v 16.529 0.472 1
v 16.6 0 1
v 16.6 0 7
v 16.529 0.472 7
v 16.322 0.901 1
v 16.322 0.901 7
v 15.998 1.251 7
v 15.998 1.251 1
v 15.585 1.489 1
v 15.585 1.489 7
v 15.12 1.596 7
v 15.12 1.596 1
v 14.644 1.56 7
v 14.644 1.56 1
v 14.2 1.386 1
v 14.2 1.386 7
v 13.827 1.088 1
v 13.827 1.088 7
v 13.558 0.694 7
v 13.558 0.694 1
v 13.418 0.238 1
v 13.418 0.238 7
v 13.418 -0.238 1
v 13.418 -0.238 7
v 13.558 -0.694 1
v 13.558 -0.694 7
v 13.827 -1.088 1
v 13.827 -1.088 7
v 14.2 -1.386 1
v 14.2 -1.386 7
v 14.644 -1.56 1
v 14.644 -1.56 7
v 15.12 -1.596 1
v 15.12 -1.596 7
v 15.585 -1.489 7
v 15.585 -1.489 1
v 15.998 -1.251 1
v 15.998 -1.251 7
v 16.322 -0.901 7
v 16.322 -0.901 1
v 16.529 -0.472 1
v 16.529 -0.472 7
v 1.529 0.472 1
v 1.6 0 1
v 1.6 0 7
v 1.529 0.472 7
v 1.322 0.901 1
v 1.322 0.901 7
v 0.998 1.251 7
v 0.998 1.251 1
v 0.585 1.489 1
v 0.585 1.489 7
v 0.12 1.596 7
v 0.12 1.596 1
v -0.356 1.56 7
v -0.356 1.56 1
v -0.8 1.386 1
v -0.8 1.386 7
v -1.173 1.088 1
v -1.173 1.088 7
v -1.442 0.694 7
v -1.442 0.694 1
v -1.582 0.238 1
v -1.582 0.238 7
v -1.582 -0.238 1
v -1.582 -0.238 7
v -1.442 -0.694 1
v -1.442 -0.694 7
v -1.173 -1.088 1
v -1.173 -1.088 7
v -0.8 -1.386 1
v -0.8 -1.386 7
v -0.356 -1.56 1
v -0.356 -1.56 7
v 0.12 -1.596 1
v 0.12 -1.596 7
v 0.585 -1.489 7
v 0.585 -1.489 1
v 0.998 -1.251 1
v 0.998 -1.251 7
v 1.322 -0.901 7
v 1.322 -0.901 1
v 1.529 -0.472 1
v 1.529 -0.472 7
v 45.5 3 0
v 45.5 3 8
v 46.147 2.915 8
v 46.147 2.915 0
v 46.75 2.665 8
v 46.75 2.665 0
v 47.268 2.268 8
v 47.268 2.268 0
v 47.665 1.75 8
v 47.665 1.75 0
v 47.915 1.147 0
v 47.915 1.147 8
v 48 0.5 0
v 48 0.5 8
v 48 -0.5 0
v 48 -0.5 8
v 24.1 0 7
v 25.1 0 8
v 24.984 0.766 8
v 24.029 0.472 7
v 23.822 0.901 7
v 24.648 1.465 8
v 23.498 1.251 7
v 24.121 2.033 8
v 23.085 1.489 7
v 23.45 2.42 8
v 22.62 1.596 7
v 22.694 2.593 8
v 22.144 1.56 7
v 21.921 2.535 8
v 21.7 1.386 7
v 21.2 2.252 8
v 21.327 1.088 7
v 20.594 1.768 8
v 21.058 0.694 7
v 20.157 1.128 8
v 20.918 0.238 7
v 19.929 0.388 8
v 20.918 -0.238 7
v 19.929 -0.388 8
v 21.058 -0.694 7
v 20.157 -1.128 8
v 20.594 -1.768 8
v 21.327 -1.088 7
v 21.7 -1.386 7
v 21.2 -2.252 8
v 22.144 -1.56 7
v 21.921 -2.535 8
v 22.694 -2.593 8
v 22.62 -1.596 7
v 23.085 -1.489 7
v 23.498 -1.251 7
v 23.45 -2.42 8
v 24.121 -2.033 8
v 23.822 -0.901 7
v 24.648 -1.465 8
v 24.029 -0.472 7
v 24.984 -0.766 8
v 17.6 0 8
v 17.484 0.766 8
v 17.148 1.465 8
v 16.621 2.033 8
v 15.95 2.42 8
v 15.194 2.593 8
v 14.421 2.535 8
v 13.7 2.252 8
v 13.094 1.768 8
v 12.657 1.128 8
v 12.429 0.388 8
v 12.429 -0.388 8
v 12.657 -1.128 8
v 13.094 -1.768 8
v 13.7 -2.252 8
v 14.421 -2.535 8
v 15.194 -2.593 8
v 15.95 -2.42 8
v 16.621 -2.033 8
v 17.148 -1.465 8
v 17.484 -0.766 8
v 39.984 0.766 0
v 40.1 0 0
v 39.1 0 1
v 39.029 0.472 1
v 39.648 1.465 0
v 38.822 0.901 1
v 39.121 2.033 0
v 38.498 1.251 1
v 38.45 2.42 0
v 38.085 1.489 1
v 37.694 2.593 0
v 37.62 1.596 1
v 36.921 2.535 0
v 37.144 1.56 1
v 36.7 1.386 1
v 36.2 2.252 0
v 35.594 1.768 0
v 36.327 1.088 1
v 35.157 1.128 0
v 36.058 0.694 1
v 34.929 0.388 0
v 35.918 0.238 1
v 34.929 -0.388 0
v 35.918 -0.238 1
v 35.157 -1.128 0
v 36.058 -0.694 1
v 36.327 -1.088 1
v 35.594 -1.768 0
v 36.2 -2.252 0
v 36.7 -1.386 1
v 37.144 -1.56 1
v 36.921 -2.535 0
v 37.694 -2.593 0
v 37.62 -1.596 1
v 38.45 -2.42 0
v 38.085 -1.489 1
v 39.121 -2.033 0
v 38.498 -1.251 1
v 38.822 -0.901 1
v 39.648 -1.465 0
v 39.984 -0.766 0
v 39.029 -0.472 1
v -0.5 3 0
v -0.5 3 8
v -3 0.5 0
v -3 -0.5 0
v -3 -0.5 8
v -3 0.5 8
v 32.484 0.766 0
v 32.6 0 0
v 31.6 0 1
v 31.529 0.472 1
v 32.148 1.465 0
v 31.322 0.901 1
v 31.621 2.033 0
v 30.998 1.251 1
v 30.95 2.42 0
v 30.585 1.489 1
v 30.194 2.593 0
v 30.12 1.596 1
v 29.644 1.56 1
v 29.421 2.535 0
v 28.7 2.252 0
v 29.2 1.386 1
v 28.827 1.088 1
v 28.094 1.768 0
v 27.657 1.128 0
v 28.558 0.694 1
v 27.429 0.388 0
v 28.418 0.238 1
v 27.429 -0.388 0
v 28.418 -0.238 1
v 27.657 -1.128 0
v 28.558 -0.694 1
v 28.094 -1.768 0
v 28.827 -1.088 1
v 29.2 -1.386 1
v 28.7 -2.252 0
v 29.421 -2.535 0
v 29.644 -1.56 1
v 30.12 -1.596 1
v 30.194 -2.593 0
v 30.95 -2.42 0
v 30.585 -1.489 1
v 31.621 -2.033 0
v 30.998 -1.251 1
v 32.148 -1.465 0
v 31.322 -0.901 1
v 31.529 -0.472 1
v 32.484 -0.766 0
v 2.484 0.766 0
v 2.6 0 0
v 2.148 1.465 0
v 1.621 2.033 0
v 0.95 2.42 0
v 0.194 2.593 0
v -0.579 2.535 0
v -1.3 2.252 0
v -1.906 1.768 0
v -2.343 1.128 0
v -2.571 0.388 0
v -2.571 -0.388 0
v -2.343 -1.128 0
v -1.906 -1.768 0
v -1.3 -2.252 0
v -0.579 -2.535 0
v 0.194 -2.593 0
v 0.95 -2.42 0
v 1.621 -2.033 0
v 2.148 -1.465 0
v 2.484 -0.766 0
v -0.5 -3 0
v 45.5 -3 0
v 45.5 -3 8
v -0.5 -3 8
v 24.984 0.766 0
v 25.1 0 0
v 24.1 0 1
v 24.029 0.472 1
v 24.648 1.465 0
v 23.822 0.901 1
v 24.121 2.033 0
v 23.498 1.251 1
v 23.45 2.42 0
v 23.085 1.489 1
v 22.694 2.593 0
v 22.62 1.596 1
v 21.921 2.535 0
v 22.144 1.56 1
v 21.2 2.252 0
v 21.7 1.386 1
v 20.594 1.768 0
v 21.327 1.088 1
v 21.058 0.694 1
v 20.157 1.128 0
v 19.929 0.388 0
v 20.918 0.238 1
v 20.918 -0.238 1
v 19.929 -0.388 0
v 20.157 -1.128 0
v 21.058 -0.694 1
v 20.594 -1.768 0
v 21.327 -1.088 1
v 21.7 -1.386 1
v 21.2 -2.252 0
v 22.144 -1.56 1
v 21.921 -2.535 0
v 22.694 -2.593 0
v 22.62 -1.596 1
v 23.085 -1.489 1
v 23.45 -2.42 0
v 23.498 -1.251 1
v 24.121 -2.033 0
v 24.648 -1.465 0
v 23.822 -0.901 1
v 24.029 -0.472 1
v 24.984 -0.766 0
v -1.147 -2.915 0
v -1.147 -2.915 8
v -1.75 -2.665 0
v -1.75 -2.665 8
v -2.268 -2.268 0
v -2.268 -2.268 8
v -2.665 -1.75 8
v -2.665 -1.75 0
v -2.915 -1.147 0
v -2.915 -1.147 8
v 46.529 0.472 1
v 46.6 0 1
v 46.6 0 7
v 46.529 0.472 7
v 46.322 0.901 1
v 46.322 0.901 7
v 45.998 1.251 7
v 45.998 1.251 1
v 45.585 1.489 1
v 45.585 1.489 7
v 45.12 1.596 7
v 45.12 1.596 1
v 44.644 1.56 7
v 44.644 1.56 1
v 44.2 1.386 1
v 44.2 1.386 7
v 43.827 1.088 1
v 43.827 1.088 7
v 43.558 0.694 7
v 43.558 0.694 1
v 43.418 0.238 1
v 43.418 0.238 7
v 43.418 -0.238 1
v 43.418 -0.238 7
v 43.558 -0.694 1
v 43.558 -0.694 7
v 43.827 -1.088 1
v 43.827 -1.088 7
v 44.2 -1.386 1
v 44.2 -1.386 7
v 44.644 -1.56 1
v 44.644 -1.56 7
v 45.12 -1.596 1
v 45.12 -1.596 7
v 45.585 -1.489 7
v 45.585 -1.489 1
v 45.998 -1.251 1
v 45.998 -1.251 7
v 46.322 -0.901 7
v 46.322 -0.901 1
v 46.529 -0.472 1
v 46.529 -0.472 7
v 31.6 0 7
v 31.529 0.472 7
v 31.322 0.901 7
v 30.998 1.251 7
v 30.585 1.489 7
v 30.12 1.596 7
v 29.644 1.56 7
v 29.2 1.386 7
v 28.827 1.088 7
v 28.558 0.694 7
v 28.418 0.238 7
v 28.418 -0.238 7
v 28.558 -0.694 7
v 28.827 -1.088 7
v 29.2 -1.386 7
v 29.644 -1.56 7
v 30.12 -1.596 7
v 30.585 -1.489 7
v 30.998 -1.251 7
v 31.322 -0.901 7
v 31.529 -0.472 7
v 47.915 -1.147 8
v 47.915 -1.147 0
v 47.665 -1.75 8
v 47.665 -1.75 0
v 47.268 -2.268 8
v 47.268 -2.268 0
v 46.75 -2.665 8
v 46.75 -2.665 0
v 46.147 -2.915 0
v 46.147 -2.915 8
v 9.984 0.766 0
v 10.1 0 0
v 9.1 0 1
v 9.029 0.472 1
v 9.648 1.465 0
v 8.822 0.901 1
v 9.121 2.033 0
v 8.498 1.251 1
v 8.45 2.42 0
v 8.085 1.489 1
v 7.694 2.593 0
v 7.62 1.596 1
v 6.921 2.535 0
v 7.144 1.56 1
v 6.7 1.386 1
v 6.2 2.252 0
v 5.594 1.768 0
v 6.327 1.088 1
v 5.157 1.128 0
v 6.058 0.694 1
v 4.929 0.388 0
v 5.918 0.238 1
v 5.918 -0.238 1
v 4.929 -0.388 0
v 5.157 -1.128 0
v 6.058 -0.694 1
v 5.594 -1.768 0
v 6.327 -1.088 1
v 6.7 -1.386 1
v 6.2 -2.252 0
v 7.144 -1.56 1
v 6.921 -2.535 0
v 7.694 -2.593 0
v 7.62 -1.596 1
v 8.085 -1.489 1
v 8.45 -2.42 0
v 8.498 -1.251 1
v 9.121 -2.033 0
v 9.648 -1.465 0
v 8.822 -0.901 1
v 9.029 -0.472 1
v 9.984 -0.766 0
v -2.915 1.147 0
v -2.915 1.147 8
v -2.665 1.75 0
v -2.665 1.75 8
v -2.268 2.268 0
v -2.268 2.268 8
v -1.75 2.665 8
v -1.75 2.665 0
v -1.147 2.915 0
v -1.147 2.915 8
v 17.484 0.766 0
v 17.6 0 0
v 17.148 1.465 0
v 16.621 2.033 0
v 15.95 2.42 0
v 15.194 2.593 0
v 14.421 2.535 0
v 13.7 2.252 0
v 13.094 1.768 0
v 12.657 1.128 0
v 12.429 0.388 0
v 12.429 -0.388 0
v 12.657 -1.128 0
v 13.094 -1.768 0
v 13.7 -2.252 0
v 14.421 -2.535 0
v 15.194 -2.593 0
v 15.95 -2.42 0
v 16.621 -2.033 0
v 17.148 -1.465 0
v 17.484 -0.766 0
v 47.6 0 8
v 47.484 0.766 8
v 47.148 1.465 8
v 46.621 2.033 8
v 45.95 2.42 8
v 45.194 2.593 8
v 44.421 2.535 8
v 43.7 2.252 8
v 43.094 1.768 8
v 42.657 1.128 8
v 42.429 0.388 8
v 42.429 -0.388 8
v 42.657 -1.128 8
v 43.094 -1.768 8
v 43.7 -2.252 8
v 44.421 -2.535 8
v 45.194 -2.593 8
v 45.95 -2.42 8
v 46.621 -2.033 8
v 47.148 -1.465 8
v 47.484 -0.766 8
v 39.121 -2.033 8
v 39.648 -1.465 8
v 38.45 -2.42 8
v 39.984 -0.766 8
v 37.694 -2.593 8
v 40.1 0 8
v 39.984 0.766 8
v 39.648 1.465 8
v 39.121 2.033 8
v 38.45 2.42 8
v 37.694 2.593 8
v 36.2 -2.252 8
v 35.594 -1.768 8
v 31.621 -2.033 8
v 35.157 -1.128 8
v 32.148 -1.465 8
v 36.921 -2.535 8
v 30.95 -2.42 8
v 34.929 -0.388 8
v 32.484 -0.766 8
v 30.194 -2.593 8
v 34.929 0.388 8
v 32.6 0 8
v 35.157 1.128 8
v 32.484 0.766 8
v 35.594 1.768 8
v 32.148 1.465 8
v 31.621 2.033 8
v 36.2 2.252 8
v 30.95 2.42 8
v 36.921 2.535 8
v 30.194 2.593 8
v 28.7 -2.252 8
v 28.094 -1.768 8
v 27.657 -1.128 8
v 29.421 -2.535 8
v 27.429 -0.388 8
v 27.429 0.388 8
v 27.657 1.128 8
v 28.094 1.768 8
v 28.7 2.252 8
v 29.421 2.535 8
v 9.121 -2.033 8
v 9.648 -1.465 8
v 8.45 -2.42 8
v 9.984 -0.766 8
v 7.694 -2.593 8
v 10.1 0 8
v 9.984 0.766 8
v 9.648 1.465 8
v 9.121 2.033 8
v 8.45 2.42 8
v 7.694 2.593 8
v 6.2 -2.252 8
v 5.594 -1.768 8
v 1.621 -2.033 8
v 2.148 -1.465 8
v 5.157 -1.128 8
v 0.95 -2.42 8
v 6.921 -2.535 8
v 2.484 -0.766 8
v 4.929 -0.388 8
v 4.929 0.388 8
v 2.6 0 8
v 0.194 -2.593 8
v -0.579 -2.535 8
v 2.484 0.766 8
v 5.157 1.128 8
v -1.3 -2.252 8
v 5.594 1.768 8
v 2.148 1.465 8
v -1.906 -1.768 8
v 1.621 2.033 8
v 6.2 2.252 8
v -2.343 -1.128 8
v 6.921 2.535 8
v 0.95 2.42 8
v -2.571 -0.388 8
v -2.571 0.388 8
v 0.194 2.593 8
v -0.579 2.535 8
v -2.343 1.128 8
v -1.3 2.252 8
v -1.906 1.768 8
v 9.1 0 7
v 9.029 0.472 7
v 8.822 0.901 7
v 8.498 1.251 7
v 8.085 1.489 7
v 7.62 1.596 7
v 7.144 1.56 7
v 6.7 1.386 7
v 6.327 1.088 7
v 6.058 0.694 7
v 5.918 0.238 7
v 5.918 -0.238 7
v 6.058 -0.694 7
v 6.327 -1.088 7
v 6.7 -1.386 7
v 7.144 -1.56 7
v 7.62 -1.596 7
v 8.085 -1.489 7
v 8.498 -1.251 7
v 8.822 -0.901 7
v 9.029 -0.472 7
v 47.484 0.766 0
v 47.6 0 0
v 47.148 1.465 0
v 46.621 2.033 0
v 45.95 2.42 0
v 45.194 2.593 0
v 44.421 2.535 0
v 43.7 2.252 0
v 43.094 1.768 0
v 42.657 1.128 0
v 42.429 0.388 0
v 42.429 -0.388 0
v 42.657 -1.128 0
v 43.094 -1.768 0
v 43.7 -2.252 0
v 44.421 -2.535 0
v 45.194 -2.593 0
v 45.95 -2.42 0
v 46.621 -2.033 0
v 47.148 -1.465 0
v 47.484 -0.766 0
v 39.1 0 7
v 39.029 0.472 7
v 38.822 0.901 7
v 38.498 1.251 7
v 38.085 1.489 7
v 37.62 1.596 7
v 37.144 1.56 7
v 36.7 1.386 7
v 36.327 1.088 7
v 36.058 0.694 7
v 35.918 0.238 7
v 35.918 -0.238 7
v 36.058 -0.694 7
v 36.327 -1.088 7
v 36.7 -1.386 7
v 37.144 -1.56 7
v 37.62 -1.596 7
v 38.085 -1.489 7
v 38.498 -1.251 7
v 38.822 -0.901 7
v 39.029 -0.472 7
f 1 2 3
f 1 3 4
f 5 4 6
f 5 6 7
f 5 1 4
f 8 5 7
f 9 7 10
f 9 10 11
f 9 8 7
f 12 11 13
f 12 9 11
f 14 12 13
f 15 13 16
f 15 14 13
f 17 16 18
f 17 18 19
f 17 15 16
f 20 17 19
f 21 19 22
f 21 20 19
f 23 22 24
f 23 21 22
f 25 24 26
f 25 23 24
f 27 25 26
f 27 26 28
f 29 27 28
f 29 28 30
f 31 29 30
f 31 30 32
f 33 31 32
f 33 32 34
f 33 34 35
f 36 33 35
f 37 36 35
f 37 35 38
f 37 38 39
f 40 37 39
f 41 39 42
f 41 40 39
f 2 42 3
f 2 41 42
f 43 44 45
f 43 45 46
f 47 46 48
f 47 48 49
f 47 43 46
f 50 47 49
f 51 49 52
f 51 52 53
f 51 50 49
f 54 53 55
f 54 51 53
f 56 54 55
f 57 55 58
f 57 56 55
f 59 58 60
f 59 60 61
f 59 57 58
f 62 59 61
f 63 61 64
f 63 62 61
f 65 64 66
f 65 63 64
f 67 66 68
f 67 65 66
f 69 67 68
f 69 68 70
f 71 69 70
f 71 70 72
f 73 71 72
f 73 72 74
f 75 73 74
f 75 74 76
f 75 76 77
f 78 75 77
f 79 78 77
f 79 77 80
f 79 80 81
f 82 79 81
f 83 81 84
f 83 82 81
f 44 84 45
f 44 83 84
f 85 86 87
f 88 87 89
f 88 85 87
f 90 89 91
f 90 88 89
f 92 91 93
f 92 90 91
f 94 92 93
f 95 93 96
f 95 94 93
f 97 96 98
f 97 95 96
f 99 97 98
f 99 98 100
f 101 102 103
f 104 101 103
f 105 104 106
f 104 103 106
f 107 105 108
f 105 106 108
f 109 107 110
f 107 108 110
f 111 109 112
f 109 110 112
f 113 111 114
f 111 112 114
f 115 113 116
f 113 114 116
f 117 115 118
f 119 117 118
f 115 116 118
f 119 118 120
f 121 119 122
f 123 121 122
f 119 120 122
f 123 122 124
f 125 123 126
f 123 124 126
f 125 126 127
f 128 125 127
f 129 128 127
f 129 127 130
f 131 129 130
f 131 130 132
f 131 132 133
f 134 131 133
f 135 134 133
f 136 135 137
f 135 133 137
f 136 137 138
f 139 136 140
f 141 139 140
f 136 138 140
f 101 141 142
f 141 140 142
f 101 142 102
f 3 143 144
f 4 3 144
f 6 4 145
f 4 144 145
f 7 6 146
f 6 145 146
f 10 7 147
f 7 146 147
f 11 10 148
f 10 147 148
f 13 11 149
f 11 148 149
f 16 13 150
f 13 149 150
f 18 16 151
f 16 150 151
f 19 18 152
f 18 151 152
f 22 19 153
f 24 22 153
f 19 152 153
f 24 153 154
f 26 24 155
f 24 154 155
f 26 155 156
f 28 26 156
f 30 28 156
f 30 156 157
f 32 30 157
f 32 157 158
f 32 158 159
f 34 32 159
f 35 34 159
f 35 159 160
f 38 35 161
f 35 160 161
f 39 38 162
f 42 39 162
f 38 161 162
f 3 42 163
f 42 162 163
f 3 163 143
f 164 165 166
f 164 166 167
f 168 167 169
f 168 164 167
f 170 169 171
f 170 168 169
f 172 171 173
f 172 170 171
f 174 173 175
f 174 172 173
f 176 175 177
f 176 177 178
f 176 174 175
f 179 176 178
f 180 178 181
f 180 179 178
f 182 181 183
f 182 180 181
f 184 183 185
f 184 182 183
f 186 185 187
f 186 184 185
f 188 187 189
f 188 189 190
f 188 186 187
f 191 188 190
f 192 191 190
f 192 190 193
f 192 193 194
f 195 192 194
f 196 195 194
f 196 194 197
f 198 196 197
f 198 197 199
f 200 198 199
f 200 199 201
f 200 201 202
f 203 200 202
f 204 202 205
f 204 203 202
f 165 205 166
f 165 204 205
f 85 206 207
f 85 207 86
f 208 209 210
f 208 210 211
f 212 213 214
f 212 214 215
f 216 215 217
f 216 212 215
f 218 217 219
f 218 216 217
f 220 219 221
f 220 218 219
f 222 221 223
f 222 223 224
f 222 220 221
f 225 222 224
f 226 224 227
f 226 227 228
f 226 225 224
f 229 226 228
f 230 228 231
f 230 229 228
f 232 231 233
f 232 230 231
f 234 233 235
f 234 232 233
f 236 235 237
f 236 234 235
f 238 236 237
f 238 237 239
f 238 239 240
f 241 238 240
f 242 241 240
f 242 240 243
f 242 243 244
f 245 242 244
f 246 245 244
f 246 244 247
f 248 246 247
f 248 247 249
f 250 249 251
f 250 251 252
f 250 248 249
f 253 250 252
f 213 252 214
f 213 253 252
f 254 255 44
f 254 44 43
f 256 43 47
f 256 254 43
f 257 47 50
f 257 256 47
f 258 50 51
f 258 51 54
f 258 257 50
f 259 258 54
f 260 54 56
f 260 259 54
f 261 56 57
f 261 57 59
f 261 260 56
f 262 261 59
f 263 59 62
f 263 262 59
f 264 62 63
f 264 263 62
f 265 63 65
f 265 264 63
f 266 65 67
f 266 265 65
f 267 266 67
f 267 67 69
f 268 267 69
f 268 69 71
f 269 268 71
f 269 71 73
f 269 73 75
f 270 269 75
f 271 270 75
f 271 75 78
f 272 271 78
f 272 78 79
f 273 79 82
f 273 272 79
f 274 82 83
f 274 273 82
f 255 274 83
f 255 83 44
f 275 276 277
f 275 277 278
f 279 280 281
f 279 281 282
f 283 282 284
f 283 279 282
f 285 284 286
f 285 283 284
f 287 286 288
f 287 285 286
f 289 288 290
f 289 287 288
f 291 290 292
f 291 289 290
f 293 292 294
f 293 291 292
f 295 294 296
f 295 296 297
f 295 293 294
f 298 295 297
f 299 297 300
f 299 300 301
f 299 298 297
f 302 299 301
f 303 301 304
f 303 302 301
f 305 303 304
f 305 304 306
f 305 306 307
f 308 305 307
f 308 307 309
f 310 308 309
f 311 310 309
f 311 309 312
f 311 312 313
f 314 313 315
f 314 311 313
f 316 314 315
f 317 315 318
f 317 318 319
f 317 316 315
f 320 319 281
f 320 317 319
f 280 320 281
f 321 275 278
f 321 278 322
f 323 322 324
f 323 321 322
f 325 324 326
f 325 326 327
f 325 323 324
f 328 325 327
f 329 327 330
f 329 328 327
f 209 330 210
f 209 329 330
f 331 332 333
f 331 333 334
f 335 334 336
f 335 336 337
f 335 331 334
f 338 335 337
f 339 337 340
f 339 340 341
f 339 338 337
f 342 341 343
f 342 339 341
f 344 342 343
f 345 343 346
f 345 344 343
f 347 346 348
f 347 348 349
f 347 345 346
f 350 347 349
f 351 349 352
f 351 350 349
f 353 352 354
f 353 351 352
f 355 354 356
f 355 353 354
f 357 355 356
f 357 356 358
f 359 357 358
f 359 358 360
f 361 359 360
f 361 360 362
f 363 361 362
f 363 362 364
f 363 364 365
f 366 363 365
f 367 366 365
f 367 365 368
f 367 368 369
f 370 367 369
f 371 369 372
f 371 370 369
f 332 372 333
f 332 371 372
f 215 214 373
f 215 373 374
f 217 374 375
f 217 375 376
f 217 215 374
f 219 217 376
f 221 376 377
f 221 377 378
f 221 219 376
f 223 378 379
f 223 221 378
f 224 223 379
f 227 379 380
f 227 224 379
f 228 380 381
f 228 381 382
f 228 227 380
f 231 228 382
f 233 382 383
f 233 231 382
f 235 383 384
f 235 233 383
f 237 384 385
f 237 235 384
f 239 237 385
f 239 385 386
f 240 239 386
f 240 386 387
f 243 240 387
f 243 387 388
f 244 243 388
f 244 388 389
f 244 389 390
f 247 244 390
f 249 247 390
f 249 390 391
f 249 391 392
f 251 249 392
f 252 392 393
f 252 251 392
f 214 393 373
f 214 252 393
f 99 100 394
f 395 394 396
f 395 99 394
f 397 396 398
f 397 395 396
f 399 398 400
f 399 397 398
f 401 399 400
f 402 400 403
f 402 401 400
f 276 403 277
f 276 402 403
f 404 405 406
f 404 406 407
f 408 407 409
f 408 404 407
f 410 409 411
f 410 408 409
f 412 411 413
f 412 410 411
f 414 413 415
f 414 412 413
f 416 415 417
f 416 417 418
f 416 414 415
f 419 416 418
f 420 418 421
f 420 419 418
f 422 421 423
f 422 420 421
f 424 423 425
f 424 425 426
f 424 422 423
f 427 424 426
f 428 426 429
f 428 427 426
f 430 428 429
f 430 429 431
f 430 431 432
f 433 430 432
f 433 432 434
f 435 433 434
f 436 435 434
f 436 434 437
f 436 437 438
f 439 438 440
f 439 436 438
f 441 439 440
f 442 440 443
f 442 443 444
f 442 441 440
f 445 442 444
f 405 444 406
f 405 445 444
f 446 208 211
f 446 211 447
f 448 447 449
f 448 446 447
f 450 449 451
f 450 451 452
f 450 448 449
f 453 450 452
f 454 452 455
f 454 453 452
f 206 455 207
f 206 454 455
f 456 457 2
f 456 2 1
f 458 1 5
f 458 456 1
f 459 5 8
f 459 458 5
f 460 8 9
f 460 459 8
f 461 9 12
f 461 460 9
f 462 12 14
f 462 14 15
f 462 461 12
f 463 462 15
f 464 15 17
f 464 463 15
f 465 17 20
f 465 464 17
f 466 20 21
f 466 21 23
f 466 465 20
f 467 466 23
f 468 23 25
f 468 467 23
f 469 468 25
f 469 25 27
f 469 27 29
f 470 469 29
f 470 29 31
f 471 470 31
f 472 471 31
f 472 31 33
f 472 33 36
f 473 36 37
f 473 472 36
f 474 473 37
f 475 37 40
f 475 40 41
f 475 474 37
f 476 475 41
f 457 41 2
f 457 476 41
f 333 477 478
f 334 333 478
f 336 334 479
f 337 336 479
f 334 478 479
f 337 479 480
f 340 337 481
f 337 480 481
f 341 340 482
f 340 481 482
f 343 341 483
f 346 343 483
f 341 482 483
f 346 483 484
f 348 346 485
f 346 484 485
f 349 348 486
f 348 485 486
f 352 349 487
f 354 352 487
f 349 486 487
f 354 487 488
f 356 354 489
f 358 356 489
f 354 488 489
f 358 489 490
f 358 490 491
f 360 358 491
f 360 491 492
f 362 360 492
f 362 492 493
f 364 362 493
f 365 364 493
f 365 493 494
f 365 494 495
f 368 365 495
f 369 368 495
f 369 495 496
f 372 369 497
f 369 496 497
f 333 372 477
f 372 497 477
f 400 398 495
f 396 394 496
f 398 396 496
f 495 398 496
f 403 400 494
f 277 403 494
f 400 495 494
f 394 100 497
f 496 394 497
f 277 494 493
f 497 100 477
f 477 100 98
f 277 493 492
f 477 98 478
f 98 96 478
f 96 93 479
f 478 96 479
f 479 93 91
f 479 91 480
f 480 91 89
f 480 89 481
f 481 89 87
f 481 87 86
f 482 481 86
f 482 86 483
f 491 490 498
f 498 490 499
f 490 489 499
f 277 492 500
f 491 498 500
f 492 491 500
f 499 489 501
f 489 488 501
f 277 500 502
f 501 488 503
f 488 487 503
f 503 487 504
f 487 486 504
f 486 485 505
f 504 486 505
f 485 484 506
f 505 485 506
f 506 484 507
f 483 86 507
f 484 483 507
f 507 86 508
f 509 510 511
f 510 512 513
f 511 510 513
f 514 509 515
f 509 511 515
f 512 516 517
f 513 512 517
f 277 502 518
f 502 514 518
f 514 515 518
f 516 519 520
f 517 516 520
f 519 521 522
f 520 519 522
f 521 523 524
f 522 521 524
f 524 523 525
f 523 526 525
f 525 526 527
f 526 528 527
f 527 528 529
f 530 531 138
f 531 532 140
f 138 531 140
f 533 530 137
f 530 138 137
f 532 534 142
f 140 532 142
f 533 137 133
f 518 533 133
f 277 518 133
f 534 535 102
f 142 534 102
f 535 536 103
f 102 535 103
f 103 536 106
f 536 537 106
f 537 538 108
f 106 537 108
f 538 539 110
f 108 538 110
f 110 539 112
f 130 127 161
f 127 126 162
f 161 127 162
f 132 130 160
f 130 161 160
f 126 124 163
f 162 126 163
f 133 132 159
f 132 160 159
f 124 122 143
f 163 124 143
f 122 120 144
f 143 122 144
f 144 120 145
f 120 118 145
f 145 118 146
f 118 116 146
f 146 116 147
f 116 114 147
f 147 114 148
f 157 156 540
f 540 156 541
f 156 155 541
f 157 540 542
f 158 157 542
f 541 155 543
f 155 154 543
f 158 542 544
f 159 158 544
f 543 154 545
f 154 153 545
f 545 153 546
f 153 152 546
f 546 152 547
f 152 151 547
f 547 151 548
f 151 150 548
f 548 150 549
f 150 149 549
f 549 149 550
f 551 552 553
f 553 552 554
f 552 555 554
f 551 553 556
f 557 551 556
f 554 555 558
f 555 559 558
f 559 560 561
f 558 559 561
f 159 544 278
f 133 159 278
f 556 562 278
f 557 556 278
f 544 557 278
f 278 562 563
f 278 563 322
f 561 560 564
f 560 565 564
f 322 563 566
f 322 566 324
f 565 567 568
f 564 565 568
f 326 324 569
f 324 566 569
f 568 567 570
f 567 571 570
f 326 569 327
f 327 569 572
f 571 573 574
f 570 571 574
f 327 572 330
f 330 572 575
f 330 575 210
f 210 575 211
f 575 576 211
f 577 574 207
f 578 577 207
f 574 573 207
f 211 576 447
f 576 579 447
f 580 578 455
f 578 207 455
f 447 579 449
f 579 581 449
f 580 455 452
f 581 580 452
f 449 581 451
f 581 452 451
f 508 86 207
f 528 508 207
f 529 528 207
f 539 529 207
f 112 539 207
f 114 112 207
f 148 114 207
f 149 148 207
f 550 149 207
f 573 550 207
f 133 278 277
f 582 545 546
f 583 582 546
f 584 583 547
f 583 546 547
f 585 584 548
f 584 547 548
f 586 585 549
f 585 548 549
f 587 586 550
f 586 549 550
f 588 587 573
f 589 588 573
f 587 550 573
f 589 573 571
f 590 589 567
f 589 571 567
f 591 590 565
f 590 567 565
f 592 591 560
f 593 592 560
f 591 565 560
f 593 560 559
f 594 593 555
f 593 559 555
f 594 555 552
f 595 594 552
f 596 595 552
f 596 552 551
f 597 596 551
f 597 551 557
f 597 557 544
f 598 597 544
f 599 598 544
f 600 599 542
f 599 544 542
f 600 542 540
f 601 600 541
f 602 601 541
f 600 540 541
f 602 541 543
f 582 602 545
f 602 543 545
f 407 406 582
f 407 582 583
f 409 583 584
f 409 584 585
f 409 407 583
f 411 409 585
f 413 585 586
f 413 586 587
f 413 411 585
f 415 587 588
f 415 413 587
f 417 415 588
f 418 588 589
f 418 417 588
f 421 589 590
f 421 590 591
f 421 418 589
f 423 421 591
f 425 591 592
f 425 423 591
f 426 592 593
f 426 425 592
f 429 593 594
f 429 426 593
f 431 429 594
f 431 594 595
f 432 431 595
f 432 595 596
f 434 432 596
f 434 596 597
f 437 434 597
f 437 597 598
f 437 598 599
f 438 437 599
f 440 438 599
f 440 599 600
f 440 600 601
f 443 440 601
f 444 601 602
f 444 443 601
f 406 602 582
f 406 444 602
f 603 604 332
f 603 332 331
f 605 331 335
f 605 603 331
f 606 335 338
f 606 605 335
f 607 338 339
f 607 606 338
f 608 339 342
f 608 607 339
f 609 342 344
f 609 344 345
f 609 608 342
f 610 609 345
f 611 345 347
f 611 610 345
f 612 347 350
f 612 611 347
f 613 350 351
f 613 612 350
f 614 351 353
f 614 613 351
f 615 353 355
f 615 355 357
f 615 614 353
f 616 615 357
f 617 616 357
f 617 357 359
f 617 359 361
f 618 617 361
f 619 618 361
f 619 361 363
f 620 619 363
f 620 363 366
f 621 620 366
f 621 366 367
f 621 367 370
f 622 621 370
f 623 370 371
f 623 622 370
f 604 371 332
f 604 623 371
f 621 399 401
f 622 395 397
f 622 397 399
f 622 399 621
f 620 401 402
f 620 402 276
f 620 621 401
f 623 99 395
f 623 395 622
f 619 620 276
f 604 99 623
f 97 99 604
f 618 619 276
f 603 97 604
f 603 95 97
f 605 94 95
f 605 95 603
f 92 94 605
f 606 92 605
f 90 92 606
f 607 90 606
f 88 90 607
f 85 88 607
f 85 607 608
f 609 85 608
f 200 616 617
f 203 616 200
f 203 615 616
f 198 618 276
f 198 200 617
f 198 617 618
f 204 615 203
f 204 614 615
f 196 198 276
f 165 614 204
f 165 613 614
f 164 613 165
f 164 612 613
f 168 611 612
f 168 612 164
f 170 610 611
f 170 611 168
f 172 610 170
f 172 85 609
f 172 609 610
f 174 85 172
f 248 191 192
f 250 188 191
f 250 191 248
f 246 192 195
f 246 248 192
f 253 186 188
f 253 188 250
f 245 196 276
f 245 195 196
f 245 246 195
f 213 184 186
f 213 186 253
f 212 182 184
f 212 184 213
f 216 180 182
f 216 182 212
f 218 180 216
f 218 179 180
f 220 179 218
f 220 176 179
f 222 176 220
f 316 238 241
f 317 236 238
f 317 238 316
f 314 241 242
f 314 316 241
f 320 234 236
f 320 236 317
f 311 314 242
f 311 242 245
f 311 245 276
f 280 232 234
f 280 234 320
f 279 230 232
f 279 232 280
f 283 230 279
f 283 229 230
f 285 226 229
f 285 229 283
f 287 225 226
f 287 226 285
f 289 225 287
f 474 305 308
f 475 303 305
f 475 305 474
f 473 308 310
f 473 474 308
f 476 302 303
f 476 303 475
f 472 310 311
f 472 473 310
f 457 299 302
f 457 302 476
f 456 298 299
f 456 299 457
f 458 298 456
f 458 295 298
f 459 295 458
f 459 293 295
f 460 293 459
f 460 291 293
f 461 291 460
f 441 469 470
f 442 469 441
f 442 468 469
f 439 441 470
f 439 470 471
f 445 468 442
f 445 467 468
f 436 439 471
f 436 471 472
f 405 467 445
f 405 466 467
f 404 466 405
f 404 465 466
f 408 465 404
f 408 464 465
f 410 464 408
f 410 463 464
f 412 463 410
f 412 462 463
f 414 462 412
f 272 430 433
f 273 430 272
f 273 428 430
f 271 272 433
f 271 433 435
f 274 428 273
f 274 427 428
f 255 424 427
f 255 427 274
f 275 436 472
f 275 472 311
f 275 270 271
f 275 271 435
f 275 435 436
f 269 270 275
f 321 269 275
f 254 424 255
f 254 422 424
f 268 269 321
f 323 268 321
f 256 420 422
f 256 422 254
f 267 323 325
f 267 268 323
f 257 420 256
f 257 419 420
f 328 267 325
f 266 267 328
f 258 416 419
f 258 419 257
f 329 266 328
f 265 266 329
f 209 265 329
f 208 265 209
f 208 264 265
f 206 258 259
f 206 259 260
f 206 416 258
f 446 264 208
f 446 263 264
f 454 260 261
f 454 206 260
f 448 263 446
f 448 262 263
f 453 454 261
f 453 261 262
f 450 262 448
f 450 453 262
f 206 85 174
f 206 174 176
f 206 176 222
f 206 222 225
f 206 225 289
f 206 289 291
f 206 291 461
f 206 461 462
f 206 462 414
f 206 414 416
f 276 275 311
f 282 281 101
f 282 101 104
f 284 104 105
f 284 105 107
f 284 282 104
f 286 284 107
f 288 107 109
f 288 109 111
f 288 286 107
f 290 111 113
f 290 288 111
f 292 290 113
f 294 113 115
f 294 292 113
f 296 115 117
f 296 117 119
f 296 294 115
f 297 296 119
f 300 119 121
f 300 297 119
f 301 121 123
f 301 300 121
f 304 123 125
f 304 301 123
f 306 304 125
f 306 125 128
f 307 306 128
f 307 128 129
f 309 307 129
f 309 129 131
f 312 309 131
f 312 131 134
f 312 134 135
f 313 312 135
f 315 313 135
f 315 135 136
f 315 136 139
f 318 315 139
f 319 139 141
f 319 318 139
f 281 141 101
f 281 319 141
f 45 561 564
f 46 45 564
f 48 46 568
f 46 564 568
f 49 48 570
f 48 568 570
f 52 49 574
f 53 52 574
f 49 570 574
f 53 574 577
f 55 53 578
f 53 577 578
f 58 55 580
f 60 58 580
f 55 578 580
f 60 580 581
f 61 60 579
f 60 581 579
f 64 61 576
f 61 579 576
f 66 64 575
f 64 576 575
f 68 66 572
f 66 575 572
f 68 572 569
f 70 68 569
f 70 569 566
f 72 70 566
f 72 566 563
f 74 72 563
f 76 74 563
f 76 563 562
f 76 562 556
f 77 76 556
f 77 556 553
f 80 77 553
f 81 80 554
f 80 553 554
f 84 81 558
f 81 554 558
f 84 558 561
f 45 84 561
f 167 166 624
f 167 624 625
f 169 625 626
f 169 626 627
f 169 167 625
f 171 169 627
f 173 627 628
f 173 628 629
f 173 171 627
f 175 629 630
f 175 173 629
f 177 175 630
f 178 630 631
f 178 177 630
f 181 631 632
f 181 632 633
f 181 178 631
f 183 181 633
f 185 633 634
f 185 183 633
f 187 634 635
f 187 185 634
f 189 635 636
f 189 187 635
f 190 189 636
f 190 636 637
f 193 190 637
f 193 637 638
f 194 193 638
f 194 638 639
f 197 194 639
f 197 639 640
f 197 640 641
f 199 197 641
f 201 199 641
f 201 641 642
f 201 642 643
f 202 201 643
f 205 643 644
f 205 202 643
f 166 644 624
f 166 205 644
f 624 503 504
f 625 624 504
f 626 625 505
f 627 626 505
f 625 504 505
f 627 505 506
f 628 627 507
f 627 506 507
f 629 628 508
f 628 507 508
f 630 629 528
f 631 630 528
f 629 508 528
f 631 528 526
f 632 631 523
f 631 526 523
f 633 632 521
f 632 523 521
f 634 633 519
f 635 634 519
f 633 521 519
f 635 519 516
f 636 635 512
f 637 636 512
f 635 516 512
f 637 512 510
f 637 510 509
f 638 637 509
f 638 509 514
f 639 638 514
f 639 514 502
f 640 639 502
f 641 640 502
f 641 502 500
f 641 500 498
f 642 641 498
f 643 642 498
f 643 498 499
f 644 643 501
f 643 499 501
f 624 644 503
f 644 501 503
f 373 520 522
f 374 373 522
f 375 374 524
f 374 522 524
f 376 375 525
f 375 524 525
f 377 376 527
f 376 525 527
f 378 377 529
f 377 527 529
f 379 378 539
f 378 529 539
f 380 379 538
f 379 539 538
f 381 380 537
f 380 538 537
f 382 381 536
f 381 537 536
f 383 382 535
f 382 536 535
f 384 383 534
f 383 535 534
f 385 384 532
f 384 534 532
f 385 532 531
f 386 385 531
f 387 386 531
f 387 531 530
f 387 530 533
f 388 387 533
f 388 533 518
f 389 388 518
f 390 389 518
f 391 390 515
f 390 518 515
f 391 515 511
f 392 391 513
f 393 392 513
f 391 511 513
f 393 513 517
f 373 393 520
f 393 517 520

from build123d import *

# Parameters (mm, degrees)
SKETCH1_R           = 1.6
BOSS_EXTRUDE1_DEPTH = 8
CHAMFER1_SIZE       = 1


with BuildPart() as part:
    # Sketch1 → Boss-Extrude1 (new body)
    with BuildSketch(Plane.XY):
        with BuildLine():
            Line((-0.5, 3), (45.5, 3))
            ThreePointArc((45.5, 3), (47.267766953, 2.267766953), (48, 0.5))
            Line((48, 0.5), (48, -0.5))
            ThreePointArc((48, -0.5), (47.267766953, -2.267766953), (45.5, -3))
            Line((45.5, -3), (-0.5, -3))
            ThreePointArc((-0.5, -3), (-2.267766953, -2.267766953), (-3, -0.5))
            Line((-3, -0.5), (-3, 0.5))
            ThreePointArc((-3, 0.5), (-2.267766953, 2.267766953), (-0.5, 3))
        make_face()
        Circle(SKETCH1_R, mode=Mode.SUBTRACT)
        with Locations((7.5, 0)):
            Circle(SKETCH1_R, mode=Mode.SUBTRACT)
        with Locations((15, 0)):
            Circle(SKETCH1_R, mode=Mode.SUBTRACT)
        with Locations((22.5, 0)):
            Circle(SKETCH1_R, mode=Mode.SUBTRACT)
        with Locations((30, 0)):
            Circle(SKETCH1_R, mode=Mode.SUBTRACT)
        with Locations((37.5, 0)):
            Circle(SKETCH1_R, mode=Mode.SUBTRACT)
        with Locations((45, 0)):
            Circle(SKETCH1_R, mode=Mode.SUBTRACT)
    extrude(amount=BOSS_EXTRUDE1_DEPTH)

    # Chamfer1
    chamfer1_edges = [part.edges().sort_by_distance(p)[0] for p in [
        (-1.6, 0, 0),
        (-1.6, 0, 8),
        (5.9, 0, 0),
        (5.9, 0, 8),
        (13.4, 0, 0),
        (13.4, 0, 8),
        (20.9, 0, 0),
        (20.9, 0, 8),
        (28.4, 0, 0),
        (28.4, 0, 8),
        (35.9, 0, 0),
        (35.9, 0, 8),
        (43.4, 0, 0),
        (43.4, 0, 8),
    ]]
    chamfer(chamfer1_edges, length=CHAMFER1_SIZE)


solid = part.part
